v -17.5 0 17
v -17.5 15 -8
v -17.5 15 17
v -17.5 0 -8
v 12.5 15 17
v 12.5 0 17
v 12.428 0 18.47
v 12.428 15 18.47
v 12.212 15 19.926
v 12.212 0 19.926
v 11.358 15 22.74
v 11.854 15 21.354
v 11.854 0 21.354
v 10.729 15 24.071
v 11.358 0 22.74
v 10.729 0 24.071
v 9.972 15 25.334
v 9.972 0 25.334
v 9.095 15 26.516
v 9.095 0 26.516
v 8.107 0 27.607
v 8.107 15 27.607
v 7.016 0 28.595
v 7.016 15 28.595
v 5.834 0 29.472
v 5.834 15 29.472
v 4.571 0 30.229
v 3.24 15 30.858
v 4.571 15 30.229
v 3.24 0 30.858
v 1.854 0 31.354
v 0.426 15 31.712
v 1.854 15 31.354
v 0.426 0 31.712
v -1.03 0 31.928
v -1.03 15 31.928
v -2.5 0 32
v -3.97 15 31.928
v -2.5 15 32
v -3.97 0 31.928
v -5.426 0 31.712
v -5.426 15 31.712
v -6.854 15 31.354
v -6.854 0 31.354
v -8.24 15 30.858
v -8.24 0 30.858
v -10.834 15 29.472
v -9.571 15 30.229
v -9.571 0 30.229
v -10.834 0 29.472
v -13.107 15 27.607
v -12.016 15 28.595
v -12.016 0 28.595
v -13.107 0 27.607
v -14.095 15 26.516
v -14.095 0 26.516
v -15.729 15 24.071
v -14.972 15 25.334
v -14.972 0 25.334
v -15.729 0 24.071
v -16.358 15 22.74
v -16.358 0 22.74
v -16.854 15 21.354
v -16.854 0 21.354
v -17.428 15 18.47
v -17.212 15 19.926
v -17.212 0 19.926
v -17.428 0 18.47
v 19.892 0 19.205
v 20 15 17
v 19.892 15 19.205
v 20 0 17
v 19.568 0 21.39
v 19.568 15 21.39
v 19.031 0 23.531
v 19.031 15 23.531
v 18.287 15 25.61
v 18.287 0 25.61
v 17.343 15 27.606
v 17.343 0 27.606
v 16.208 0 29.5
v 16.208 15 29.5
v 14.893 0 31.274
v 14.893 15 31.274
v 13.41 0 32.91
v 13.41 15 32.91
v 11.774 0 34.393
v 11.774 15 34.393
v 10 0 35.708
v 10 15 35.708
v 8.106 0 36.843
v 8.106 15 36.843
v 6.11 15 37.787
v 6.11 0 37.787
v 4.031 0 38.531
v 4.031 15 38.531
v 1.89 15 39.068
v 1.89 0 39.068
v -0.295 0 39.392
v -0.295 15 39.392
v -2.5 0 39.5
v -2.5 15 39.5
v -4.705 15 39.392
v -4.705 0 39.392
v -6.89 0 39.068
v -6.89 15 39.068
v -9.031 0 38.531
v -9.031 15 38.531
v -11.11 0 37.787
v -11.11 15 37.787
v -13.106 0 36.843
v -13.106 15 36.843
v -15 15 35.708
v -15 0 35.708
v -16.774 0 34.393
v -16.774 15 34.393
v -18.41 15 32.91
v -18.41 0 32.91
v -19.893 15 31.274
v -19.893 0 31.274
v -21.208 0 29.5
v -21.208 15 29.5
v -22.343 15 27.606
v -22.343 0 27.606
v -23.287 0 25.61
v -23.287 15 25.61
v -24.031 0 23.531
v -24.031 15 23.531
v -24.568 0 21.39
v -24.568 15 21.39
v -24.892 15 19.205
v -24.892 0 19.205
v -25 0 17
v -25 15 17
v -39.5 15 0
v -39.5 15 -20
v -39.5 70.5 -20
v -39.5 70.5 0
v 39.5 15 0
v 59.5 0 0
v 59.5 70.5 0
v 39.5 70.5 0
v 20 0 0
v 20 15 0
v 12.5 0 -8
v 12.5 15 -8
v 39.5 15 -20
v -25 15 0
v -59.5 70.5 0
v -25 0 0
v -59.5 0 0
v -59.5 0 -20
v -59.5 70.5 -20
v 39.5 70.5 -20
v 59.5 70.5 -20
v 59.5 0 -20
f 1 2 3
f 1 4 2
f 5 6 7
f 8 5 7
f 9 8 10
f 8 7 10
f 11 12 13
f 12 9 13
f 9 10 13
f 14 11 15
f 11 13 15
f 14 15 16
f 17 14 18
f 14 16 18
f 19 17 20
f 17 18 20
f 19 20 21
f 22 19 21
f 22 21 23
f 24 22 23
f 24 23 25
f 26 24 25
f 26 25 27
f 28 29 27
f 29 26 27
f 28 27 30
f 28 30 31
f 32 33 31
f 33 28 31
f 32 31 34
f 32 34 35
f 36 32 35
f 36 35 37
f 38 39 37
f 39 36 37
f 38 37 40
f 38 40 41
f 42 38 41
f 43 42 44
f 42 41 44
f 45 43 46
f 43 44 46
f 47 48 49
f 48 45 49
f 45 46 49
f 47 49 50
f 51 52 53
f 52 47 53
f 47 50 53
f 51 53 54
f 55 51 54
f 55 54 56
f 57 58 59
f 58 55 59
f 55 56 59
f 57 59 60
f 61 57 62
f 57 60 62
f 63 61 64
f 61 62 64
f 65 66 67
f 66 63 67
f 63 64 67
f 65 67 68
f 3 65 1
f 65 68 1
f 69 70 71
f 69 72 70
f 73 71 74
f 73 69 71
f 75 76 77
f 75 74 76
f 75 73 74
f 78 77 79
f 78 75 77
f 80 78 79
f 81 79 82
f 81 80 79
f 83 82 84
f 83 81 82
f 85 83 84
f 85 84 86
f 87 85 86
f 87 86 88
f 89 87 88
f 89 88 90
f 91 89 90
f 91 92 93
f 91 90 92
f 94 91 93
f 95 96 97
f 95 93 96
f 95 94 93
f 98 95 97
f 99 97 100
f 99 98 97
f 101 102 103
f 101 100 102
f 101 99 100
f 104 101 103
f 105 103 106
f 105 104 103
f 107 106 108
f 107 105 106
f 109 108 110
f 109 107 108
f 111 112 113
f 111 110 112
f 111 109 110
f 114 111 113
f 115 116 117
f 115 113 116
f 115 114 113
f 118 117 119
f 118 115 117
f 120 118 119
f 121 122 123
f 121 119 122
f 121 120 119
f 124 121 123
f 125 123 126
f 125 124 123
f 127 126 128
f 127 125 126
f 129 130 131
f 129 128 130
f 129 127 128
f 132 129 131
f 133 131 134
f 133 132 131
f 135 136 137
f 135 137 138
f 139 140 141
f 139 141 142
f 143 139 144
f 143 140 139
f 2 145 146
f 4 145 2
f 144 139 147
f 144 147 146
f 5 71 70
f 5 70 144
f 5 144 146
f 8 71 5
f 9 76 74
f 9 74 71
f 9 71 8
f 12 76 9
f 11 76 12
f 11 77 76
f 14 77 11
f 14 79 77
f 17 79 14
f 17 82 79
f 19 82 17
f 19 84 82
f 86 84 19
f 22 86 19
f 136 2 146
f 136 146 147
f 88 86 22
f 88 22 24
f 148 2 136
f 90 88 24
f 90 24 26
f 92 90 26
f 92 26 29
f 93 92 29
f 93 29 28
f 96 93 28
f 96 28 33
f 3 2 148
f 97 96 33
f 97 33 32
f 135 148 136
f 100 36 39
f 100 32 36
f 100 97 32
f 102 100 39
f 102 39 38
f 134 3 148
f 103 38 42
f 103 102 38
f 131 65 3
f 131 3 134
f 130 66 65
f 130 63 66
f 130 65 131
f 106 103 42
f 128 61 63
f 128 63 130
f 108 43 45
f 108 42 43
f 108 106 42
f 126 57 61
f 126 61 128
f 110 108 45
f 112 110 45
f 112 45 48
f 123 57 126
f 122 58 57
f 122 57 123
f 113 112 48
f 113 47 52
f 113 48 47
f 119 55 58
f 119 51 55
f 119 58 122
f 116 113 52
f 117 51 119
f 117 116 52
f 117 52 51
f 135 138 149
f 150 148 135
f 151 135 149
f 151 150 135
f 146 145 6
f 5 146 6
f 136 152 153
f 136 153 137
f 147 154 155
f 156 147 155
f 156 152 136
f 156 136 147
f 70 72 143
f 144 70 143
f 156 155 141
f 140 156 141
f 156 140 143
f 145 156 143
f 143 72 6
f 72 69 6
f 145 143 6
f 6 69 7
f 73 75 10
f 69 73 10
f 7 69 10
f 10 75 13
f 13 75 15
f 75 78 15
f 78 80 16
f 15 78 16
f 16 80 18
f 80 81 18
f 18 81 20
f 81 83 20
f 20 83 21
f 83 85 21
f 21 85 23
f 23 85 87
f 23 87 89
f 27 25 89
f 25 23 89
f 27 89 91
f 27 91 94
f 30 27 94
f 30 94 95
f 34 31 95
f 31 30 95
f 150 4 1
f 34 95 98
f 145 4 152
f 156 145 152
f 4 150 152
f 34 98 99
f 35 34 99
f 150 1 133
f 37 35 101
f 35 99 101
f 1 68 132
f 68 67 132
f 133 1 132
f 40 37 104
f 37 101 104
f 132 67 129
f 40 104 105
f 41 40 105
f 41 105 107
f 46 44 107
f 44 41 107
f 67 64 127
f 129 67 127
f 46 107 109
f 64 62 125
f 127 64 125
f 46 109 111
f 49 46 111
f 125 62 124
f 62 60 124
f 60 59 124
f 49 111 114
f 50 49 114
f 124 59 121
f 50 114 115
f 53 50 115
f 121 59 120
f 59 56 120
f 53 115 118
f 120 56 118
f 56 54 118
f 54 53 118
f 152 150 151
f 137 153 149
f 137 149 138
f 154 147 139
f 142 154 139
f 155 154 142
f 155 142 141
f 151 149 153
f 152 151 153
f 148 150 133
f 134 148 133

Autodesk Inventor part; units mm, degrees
ref_plane "YZ Plane" through (0, 0, 0) normal (1, 0, 0) x (0, 1, 0)
ref_plane "XZ Plane" through (0, 0, 0) normal (0, 1, 0) x (-1, 0, 0)
ref_plane "XY Plane" through (0, 0, 0) normal (0, 0, 1) x (1, 0, 0)
sketch "스케치1" plane through (0, 0, 0) normal (0, 1, 0) x (-1, 0, 0)
  arc A0 (25, 17) -> (-20, 17) centre (2.5, 17) ccw
  arc A1 (17.5, 17) -> (-12.5, 17) centre (2.5, 17) ccw
  line L0 (17.5, 17) -> (-12.5, 17)
  line L1 (-20, 17) -> (-20, 0)
  line L2 (-20, -20) -> (25, -20)
  line L3 (25, 0) -> (25, 17)
  line L4 (-12.5, 17) -> (17.5, 17)
  line L5 (17.5, 17) -> (17.5, 0)
  line L6 (17.5, 0) -> (-12.5, 0)
  line L7 (-12.5, 0) -> (-12.5, 17)
  line L8 (59.5, -20) -> (-59.5, -20)
  line L9 (-59.5, -20) -> (-59.5, 0)
  line L10 (59.5, 0) -> (59.5, -20)
  line L11 (25, 0) -> (59.5, 0)
  line L12 (-59.5, 0) -> (-20, 0)
  line L13 (-12.5, 0) -> (17.5, 0)
  line L14 (17.5, 0) -> (-12.5, 0)
  line L15 (-12.5, 0) -> (-12.5, -8)
  line L16 (-12.5, -8) -> (17.5, -8)
  line L17 (17.5, -8) -> (17.5, 0)
  point P0 (0, 0)
  point P1 (0, 17)
  point P2 (-59.5, -10)
  dimension "d1" = 30
  dimension "d2" = 45
  dimension "d3" = 0
  dimension "d4" = 17
  dimension "d5" = 37
  dimension "d6" = 119
  dimension "d10" = 20
  dimension "d11" = 22.5
  dimension "d12" = 0
  dimension "d13" = 59.5
  dimension "d14" = 8
  dimension "d15" = 39.5
extrude "돌출1" add sketch "스케치1" along normal blind 15
sketch "스케치2" plane through (0, 15, 0) normal (0, 1, 0) x (1, 0, 0)
  point P0 (0, 0)
sketch "스케치3" plane through (0, 15, 0) normal (0, 1, 0) x (1, 0, 0)
  line L0 (-39.5, 0) -> (-59.5, 0)
  line L1 (-59.5, 0) -> (-59.5, 20)
  line L2 (-59.5, 20) -> (-39.5, 20)
  line L3 (-39.5, 20) -> (-39.5, 0)
  line L4 (-39.5, 0) -> (-59.5, 20) construction
  line L5 (-59.5, 0) -> (-39.5, 20) construction
  line L6 (-59.5, 20) -> (-59.5, 0) projected
  line L7 (-59.5, 0) -> (-25, 0) projected
  line L8 (0, 0) -> (0, 5.3551)
  line L9 (39.5, 0) -> (59.5, 0)
  line L10 (59.5, 0) -> (59.5, 20)
  line L11 (59.5, 20) -> (39.5, 20)
  line L12 (39.5, 20) -> (39.5, 0)
  line L13 (39.5, 0) -> (59.5, 20) construction
  line L14 (59.5, 0) -> (39.5, 20) construction
  line L15 (59.5, 20) -> (59.5, 0)
  line L16 (59.5, 0) -> (25, 0)
  point P0 (-49.5, 10)
  point P1 (-49.5, 0)
  point P2 (49.5, 10)
  point P3 (49.5, 0)
  dimension "d16" = 20
  dimension "d17" = 20
  dimension "d18" = 0
  dimension "d19" = 0
extrude "돌출2" add sketch "스케치3" along normal blind 55.5
equation "\"d13\" = 0.5 * d6"
properties part number "액추에이터 지지대 3D 프린트"
